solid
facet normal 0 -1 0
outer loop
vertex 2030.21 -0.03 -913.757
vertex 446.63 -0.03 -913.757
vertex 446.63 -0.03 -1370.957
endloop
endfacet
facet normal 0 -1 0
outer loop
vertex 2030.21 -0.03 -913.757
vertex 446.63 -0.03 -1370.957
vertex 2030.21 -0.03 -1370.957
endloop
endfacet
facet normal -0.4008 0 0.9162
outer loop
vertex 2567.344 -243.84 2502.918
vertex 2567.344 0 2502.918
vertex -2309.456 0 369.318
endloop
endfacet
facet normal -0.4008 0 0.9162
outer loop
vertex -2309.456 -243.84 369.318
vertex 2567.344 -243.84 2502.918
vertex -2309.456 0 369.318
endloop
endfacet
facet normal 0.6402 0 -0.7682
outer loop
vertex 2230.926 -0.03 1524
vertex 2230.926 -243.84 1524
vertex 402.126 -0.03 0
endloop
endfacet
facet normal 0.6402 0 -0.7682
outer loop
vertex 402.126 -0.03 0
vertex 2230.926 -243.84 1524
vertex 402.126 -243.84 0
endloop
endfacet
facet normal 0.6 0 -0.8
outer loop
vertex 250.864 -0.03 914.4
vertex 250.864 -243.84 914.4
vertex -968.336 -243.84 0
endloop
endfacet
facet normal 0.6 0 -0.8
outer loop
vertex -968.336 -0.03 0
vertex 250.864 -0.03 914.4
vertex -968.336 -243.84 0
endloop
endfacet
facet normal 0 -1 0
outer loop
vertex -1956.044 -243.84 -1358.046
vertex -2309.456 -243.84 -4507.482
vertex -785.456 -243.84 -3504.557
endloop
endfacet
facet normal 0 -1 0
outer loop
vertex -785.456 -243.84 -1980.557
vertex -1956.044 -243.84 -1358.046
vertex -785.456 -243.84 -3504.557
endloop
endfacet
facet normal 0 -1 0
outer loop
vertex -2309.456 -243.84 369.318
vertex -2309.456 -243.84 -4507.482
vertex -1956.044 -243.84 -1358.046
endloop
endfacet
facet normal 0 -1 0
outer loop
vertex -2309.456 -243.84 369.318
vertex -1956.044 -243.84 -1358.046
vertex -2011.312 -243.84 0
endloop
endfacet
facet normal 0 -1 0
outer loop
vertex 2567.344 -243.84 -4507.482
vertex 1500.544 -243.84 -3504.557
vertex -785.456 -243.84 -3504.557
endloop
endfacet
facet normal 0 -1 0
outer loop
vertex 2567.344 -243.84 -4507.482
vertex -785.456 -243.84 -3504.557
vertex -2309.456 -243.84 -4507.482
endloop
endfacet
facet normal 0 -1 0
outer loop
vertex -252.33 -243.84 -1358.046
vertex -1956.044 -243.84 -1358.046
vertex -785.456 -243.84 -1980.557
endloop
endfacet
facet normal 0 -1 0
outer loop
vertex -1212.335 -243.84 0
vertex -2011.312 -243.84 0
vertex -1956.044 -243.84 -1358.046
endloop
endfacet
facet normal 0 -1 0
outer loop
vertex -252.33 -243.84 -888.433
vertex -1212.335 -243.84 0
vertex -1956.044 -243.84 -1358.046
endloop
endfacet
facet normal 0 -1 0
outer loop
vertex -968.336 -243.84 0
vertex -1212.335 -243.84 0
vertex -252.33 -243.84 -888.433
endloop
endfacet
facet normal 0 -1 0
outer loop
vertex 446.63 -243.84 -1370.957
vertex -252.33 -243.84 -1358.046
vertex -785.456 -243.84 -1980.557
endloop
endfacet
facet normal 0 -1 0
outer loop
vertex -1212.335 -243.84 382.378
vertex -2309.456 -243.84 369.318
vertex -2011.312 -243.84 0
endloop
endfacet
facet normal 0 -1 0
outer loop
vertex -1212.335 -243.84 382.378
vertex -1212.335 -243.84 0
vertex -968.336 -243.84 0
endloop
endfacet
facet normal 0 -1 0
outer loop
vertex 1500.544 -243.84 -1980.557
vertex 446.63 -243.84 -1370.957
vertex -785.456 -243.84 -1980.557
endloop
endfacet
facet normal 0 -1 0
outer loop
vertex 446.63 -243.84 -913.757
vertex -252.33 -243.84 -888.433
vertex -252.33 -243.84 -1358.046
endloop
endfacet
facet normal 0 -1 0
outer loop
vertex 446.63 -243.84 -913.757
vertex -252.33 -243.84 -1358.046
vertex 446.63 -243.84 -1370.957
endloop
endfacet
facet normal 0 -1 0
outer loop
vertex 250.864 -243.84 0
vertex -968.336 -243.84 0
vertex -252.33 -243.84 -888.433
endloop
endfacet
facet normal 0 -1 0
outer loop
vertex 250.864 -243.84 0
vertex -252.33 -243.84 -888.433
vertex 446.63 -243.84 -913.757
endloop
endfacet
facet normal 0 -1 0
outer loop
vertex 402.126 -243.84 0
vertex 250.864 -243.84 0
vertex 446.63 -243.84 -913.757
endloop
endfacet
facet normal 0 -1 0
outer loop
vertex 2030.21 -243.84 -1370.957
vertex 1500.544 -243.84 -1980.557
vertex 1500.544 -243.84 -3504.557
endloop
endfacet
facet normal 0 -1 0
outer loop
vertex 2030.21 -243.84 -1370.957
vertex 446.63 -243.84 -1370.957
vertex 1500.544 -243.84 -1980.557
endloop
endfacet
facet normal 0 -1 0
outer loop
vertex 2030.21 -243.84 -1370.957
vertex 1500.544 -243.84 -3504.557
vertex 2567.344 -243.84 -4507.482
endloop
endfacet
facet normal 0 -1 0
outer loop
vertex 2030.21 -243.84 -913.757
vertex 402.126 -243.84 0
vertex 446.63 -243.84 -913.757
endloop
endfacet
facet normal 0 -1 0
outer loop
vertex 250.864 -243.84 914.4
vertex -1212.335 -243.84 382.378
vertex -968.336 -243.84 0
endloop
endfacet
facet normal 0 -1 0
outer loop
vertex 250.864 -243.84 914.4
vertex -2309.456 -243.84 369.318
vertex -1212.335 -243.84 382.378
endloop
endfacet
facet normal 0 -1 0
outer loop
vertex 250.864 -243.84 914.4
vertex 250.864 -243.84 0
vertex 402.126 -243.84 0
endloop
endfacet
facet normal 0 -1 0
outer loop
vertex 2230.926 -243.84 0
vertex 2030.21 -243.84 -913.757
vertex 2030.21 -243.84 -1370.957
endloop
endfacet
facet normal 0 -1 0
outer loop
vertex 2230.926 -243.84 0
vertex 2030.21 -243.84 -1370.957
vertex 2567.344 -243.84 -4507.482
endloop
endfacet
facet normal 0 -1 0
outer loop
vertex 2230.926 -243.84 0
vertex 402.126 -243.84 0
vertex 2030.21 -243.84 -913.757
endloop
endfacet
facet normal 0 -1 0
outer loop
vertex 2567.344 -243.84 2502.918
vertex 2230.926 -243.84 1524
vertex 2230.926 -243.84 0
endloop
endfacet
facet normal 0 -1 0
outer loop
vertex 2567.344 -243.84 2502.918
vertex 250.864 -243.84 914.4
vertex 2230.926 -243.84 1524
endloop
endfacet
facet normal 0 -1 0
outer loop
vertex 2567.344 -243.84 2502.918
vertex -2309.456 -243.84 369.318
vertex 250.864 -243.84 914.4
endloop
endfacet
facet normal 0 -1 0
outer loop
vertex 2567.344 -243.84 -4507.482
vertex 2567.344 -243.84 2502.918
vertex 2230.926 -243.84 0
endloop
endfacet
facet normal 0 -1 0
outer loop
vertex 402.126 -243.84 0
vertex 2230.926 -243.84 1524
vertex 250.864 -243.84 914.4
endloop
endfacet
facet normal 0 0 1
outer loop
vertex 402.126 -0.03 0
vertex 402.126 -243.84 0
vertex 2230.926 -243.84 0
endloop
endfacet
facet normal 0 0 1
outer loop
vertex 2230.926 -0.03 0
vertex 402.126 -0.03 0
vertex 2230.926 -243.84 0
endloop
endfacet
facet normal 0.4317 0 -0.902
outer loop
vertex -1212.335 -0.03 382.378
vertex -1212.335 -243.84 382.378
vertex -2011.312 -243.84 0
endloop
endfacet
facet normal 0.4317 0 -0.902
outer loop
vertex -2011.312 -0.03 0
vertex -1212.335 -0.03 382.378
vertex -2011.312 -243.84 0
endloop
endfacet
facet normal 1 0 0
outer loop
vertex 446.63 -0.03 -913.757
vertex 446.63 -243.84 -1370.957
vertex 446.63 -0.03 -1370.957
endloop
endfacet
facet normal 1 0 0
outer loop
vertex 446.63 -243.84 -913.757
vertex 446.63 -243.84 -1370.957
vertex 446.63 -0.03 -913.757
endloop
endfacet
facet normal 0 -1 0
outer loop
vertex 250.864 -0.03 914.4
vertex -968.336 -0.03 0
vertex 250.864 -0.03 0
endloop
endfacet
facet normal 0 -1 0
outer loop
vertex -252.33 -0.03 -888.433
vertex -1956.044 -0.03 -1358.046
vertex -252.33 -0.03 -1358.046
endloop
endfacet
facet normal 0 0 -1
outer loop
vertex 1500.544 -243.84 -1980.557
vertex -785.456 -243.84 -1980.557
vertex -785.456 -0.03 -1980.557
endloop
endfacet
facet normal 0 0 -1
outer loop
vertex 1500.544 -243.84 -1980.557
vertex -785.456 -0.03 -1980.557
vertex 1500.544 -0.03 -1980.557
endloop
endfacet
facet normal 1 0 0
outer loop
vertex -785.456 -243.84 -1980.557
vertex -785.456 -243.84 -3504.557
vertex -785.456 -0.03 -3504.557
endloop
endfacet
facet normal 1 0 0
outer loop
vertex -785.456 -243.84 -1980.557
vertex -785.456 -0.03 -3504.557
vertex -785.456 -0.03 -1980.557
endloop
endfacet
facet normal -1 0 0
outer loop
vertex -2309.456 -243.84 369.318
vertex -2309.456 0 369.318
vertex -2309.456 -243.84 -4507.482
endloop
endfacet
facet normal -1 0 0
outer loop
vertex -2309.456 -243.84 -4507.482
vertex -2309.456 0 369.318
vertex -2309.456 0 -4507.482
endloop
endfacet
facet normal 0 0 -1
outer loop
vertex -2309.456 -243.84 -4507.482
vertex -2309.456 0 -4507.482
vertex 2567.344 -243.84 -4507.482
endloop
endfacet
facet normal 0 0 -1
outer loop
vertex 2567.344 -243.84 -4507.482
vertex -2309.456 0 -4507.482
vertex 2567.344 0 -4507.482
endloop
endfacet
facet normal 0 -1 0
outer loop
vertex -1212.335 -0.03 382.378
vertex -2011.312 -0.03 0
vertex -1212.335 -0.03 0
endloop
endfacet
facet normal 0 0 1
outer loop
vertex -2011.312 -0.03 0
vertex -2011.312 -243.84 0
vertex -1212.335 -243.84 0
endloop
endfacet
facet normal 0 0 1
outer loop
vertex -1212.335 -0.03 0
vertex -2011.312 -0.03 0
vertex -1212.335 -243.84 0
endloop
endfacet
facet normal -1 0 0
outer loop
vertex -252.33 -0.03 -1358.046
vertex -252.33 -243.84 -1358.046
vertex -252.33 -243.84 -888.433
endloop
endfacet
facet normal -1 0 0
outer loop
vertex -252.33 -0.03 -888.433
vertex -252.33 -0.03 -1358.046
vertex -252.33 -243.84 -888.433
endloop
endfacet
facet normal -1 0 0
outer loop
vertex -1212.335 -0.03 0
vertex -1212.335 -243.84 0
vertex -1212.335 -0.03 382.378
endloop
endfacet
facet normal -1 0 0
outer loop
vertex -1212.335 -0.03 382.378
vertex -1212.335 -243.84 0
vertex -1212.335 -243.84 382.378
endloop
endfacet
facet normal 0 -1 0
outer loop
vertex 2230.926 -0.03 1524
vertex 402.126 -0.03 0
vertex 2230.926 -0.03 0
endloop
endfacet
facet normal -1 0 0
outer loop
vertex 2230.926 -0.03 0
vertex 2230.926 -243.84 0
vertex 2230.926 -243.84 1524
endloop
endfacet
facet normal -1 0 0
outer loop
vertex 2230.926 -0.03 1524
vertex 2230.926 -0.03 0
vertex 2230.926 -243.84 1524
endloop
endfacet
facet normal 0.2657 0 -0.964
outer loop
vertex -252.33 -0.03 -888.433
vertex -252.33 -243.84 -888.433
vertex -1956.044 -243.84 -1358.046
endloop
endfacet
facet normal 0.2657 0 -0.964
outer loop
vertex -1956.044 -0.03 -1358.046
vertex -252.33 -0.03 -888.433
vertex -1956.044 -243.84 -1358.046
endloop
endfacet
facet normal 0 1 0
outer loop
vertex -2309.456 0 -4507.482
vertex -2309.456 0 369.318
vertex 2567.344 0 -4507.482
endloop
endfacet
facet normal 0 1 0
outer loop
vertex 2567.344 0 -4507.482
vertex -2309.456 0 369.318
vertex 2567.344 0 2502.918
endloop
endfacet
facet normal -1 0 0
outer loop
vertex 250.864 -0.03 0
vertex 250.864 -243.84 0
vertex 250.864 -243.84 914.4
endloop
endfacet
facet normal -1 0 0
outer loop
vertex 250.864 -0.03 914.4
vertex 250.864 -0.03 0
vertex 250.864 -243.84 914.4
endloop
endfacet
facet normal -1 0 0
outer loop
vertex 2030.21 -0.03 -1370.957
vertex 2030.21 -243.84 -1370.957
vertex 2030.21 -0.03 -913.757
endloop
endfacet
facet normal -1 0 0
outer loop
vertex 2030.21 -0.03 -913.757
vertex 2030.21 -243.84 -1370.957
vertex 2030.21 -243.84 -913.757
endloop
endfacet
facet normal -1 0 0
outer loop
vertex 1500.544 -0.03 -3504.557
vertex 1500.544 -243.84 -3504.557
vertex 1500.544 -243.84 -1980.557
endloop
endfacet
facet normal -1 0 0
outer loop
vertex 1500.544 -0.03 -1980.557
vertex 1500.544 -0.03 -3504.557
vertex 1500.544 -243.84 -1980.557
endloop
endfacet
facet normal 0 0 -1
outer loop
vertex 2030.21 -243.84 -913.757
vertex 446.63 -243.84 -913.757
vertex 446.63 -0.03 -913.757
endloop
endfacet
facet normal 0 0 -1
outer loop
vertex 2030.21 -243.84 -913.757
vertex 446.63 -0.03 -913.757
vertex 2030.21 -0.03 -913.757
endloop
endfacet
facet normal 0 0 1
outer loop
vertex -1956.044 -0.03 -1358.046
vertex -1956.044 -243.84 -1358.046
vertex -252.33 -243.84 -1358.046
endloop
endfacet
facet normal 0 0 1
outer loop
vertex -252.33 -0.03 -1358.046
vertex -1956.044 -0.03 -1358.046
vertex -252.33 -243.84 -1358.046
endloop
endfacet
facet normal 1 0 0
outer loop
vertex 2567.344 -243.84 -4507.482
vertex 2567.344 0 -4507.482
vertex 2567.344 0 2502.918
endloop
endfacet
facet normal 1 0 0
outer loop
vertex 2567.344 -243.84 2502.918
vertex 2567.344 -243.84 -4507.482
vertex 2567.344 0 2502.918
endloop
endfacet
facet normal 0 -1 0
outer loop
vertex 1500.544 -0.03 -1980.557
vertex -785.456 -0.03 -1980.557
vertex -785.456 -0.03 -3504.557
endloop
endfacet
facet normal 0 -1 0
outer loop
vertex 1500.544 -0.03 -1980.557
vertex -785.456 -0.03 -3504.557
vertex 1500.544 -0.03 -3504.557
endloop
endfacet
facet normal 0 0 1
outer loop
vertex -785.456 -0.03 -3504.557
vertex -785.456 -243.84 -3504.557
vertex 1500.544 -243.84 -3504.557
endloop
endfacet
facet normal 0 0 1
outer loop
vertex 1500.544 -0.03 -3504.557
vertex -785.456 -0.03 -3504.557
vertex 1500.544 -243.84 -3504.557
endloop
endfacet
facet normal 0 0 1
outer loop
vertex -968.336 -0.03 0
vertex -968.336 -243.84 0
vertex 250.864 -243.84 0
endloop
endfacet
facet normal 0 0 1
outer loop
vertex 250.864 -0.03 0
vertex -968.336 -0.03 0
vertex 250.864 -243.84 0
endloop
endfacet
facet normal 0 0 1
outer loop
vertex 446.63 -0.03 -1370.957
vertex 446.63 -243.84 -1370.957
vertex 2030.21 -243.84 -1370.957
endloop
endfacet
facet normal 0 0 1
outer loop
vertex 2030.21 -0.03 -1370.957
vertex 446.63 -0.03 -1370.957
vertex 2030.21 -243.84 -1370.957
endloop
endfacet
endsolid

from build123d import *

# Parameters (mm, degrees)
F1_DEPTH = 243.84
F2_W     = 2286
F2_H     = 1524
F2_W_2   = 1583.580732
F2_H_2   = 457.2
F3_DEPTH = 243.80952


with BuildPart() as f1:
    # F0 (on Front) → F1 (new body)
    with BuildSketch(Plane.XZ):
        Polygon((2567.343831, 2502.917757), (-2309.456169, 369.317757), (-2309.456169, -4507.482243), (2567.343831, -4507.482243), align=None)
    extrude(amount=F1_DEPTH)

    # F2 (on face) → F3 (cut)
    with BuildSketch(Plane.XZ.offset(243.84)):
        Polygon((2230.925799, 0), (2230.925799, 1524), (402.125799, 0), align=None)
        Polygon((250.863831, 0), (250.863831, 914.4), (-968.336169, 0), align=None)
        Polygon((-1212.335348, 0), (-1212.335348, 382.37834), (-2011.311769, 0), align=None)
        with Locations((357.543831, -2742.557323)):
            Rectangle(F2_W, F2_H)
        with Locations((1238.420129, -1142.357323)):
            Rectangle(F2_W_2, F2_H_2)
        Polygon((-252.330035, -1358.046293), (-252.330035, -888.432682), (-1956.044436, -1358.046293), align=None)
    extrude(amount=-F3_DEPTH, mode=Mode.SUBTRACT)


solid = f1.part
